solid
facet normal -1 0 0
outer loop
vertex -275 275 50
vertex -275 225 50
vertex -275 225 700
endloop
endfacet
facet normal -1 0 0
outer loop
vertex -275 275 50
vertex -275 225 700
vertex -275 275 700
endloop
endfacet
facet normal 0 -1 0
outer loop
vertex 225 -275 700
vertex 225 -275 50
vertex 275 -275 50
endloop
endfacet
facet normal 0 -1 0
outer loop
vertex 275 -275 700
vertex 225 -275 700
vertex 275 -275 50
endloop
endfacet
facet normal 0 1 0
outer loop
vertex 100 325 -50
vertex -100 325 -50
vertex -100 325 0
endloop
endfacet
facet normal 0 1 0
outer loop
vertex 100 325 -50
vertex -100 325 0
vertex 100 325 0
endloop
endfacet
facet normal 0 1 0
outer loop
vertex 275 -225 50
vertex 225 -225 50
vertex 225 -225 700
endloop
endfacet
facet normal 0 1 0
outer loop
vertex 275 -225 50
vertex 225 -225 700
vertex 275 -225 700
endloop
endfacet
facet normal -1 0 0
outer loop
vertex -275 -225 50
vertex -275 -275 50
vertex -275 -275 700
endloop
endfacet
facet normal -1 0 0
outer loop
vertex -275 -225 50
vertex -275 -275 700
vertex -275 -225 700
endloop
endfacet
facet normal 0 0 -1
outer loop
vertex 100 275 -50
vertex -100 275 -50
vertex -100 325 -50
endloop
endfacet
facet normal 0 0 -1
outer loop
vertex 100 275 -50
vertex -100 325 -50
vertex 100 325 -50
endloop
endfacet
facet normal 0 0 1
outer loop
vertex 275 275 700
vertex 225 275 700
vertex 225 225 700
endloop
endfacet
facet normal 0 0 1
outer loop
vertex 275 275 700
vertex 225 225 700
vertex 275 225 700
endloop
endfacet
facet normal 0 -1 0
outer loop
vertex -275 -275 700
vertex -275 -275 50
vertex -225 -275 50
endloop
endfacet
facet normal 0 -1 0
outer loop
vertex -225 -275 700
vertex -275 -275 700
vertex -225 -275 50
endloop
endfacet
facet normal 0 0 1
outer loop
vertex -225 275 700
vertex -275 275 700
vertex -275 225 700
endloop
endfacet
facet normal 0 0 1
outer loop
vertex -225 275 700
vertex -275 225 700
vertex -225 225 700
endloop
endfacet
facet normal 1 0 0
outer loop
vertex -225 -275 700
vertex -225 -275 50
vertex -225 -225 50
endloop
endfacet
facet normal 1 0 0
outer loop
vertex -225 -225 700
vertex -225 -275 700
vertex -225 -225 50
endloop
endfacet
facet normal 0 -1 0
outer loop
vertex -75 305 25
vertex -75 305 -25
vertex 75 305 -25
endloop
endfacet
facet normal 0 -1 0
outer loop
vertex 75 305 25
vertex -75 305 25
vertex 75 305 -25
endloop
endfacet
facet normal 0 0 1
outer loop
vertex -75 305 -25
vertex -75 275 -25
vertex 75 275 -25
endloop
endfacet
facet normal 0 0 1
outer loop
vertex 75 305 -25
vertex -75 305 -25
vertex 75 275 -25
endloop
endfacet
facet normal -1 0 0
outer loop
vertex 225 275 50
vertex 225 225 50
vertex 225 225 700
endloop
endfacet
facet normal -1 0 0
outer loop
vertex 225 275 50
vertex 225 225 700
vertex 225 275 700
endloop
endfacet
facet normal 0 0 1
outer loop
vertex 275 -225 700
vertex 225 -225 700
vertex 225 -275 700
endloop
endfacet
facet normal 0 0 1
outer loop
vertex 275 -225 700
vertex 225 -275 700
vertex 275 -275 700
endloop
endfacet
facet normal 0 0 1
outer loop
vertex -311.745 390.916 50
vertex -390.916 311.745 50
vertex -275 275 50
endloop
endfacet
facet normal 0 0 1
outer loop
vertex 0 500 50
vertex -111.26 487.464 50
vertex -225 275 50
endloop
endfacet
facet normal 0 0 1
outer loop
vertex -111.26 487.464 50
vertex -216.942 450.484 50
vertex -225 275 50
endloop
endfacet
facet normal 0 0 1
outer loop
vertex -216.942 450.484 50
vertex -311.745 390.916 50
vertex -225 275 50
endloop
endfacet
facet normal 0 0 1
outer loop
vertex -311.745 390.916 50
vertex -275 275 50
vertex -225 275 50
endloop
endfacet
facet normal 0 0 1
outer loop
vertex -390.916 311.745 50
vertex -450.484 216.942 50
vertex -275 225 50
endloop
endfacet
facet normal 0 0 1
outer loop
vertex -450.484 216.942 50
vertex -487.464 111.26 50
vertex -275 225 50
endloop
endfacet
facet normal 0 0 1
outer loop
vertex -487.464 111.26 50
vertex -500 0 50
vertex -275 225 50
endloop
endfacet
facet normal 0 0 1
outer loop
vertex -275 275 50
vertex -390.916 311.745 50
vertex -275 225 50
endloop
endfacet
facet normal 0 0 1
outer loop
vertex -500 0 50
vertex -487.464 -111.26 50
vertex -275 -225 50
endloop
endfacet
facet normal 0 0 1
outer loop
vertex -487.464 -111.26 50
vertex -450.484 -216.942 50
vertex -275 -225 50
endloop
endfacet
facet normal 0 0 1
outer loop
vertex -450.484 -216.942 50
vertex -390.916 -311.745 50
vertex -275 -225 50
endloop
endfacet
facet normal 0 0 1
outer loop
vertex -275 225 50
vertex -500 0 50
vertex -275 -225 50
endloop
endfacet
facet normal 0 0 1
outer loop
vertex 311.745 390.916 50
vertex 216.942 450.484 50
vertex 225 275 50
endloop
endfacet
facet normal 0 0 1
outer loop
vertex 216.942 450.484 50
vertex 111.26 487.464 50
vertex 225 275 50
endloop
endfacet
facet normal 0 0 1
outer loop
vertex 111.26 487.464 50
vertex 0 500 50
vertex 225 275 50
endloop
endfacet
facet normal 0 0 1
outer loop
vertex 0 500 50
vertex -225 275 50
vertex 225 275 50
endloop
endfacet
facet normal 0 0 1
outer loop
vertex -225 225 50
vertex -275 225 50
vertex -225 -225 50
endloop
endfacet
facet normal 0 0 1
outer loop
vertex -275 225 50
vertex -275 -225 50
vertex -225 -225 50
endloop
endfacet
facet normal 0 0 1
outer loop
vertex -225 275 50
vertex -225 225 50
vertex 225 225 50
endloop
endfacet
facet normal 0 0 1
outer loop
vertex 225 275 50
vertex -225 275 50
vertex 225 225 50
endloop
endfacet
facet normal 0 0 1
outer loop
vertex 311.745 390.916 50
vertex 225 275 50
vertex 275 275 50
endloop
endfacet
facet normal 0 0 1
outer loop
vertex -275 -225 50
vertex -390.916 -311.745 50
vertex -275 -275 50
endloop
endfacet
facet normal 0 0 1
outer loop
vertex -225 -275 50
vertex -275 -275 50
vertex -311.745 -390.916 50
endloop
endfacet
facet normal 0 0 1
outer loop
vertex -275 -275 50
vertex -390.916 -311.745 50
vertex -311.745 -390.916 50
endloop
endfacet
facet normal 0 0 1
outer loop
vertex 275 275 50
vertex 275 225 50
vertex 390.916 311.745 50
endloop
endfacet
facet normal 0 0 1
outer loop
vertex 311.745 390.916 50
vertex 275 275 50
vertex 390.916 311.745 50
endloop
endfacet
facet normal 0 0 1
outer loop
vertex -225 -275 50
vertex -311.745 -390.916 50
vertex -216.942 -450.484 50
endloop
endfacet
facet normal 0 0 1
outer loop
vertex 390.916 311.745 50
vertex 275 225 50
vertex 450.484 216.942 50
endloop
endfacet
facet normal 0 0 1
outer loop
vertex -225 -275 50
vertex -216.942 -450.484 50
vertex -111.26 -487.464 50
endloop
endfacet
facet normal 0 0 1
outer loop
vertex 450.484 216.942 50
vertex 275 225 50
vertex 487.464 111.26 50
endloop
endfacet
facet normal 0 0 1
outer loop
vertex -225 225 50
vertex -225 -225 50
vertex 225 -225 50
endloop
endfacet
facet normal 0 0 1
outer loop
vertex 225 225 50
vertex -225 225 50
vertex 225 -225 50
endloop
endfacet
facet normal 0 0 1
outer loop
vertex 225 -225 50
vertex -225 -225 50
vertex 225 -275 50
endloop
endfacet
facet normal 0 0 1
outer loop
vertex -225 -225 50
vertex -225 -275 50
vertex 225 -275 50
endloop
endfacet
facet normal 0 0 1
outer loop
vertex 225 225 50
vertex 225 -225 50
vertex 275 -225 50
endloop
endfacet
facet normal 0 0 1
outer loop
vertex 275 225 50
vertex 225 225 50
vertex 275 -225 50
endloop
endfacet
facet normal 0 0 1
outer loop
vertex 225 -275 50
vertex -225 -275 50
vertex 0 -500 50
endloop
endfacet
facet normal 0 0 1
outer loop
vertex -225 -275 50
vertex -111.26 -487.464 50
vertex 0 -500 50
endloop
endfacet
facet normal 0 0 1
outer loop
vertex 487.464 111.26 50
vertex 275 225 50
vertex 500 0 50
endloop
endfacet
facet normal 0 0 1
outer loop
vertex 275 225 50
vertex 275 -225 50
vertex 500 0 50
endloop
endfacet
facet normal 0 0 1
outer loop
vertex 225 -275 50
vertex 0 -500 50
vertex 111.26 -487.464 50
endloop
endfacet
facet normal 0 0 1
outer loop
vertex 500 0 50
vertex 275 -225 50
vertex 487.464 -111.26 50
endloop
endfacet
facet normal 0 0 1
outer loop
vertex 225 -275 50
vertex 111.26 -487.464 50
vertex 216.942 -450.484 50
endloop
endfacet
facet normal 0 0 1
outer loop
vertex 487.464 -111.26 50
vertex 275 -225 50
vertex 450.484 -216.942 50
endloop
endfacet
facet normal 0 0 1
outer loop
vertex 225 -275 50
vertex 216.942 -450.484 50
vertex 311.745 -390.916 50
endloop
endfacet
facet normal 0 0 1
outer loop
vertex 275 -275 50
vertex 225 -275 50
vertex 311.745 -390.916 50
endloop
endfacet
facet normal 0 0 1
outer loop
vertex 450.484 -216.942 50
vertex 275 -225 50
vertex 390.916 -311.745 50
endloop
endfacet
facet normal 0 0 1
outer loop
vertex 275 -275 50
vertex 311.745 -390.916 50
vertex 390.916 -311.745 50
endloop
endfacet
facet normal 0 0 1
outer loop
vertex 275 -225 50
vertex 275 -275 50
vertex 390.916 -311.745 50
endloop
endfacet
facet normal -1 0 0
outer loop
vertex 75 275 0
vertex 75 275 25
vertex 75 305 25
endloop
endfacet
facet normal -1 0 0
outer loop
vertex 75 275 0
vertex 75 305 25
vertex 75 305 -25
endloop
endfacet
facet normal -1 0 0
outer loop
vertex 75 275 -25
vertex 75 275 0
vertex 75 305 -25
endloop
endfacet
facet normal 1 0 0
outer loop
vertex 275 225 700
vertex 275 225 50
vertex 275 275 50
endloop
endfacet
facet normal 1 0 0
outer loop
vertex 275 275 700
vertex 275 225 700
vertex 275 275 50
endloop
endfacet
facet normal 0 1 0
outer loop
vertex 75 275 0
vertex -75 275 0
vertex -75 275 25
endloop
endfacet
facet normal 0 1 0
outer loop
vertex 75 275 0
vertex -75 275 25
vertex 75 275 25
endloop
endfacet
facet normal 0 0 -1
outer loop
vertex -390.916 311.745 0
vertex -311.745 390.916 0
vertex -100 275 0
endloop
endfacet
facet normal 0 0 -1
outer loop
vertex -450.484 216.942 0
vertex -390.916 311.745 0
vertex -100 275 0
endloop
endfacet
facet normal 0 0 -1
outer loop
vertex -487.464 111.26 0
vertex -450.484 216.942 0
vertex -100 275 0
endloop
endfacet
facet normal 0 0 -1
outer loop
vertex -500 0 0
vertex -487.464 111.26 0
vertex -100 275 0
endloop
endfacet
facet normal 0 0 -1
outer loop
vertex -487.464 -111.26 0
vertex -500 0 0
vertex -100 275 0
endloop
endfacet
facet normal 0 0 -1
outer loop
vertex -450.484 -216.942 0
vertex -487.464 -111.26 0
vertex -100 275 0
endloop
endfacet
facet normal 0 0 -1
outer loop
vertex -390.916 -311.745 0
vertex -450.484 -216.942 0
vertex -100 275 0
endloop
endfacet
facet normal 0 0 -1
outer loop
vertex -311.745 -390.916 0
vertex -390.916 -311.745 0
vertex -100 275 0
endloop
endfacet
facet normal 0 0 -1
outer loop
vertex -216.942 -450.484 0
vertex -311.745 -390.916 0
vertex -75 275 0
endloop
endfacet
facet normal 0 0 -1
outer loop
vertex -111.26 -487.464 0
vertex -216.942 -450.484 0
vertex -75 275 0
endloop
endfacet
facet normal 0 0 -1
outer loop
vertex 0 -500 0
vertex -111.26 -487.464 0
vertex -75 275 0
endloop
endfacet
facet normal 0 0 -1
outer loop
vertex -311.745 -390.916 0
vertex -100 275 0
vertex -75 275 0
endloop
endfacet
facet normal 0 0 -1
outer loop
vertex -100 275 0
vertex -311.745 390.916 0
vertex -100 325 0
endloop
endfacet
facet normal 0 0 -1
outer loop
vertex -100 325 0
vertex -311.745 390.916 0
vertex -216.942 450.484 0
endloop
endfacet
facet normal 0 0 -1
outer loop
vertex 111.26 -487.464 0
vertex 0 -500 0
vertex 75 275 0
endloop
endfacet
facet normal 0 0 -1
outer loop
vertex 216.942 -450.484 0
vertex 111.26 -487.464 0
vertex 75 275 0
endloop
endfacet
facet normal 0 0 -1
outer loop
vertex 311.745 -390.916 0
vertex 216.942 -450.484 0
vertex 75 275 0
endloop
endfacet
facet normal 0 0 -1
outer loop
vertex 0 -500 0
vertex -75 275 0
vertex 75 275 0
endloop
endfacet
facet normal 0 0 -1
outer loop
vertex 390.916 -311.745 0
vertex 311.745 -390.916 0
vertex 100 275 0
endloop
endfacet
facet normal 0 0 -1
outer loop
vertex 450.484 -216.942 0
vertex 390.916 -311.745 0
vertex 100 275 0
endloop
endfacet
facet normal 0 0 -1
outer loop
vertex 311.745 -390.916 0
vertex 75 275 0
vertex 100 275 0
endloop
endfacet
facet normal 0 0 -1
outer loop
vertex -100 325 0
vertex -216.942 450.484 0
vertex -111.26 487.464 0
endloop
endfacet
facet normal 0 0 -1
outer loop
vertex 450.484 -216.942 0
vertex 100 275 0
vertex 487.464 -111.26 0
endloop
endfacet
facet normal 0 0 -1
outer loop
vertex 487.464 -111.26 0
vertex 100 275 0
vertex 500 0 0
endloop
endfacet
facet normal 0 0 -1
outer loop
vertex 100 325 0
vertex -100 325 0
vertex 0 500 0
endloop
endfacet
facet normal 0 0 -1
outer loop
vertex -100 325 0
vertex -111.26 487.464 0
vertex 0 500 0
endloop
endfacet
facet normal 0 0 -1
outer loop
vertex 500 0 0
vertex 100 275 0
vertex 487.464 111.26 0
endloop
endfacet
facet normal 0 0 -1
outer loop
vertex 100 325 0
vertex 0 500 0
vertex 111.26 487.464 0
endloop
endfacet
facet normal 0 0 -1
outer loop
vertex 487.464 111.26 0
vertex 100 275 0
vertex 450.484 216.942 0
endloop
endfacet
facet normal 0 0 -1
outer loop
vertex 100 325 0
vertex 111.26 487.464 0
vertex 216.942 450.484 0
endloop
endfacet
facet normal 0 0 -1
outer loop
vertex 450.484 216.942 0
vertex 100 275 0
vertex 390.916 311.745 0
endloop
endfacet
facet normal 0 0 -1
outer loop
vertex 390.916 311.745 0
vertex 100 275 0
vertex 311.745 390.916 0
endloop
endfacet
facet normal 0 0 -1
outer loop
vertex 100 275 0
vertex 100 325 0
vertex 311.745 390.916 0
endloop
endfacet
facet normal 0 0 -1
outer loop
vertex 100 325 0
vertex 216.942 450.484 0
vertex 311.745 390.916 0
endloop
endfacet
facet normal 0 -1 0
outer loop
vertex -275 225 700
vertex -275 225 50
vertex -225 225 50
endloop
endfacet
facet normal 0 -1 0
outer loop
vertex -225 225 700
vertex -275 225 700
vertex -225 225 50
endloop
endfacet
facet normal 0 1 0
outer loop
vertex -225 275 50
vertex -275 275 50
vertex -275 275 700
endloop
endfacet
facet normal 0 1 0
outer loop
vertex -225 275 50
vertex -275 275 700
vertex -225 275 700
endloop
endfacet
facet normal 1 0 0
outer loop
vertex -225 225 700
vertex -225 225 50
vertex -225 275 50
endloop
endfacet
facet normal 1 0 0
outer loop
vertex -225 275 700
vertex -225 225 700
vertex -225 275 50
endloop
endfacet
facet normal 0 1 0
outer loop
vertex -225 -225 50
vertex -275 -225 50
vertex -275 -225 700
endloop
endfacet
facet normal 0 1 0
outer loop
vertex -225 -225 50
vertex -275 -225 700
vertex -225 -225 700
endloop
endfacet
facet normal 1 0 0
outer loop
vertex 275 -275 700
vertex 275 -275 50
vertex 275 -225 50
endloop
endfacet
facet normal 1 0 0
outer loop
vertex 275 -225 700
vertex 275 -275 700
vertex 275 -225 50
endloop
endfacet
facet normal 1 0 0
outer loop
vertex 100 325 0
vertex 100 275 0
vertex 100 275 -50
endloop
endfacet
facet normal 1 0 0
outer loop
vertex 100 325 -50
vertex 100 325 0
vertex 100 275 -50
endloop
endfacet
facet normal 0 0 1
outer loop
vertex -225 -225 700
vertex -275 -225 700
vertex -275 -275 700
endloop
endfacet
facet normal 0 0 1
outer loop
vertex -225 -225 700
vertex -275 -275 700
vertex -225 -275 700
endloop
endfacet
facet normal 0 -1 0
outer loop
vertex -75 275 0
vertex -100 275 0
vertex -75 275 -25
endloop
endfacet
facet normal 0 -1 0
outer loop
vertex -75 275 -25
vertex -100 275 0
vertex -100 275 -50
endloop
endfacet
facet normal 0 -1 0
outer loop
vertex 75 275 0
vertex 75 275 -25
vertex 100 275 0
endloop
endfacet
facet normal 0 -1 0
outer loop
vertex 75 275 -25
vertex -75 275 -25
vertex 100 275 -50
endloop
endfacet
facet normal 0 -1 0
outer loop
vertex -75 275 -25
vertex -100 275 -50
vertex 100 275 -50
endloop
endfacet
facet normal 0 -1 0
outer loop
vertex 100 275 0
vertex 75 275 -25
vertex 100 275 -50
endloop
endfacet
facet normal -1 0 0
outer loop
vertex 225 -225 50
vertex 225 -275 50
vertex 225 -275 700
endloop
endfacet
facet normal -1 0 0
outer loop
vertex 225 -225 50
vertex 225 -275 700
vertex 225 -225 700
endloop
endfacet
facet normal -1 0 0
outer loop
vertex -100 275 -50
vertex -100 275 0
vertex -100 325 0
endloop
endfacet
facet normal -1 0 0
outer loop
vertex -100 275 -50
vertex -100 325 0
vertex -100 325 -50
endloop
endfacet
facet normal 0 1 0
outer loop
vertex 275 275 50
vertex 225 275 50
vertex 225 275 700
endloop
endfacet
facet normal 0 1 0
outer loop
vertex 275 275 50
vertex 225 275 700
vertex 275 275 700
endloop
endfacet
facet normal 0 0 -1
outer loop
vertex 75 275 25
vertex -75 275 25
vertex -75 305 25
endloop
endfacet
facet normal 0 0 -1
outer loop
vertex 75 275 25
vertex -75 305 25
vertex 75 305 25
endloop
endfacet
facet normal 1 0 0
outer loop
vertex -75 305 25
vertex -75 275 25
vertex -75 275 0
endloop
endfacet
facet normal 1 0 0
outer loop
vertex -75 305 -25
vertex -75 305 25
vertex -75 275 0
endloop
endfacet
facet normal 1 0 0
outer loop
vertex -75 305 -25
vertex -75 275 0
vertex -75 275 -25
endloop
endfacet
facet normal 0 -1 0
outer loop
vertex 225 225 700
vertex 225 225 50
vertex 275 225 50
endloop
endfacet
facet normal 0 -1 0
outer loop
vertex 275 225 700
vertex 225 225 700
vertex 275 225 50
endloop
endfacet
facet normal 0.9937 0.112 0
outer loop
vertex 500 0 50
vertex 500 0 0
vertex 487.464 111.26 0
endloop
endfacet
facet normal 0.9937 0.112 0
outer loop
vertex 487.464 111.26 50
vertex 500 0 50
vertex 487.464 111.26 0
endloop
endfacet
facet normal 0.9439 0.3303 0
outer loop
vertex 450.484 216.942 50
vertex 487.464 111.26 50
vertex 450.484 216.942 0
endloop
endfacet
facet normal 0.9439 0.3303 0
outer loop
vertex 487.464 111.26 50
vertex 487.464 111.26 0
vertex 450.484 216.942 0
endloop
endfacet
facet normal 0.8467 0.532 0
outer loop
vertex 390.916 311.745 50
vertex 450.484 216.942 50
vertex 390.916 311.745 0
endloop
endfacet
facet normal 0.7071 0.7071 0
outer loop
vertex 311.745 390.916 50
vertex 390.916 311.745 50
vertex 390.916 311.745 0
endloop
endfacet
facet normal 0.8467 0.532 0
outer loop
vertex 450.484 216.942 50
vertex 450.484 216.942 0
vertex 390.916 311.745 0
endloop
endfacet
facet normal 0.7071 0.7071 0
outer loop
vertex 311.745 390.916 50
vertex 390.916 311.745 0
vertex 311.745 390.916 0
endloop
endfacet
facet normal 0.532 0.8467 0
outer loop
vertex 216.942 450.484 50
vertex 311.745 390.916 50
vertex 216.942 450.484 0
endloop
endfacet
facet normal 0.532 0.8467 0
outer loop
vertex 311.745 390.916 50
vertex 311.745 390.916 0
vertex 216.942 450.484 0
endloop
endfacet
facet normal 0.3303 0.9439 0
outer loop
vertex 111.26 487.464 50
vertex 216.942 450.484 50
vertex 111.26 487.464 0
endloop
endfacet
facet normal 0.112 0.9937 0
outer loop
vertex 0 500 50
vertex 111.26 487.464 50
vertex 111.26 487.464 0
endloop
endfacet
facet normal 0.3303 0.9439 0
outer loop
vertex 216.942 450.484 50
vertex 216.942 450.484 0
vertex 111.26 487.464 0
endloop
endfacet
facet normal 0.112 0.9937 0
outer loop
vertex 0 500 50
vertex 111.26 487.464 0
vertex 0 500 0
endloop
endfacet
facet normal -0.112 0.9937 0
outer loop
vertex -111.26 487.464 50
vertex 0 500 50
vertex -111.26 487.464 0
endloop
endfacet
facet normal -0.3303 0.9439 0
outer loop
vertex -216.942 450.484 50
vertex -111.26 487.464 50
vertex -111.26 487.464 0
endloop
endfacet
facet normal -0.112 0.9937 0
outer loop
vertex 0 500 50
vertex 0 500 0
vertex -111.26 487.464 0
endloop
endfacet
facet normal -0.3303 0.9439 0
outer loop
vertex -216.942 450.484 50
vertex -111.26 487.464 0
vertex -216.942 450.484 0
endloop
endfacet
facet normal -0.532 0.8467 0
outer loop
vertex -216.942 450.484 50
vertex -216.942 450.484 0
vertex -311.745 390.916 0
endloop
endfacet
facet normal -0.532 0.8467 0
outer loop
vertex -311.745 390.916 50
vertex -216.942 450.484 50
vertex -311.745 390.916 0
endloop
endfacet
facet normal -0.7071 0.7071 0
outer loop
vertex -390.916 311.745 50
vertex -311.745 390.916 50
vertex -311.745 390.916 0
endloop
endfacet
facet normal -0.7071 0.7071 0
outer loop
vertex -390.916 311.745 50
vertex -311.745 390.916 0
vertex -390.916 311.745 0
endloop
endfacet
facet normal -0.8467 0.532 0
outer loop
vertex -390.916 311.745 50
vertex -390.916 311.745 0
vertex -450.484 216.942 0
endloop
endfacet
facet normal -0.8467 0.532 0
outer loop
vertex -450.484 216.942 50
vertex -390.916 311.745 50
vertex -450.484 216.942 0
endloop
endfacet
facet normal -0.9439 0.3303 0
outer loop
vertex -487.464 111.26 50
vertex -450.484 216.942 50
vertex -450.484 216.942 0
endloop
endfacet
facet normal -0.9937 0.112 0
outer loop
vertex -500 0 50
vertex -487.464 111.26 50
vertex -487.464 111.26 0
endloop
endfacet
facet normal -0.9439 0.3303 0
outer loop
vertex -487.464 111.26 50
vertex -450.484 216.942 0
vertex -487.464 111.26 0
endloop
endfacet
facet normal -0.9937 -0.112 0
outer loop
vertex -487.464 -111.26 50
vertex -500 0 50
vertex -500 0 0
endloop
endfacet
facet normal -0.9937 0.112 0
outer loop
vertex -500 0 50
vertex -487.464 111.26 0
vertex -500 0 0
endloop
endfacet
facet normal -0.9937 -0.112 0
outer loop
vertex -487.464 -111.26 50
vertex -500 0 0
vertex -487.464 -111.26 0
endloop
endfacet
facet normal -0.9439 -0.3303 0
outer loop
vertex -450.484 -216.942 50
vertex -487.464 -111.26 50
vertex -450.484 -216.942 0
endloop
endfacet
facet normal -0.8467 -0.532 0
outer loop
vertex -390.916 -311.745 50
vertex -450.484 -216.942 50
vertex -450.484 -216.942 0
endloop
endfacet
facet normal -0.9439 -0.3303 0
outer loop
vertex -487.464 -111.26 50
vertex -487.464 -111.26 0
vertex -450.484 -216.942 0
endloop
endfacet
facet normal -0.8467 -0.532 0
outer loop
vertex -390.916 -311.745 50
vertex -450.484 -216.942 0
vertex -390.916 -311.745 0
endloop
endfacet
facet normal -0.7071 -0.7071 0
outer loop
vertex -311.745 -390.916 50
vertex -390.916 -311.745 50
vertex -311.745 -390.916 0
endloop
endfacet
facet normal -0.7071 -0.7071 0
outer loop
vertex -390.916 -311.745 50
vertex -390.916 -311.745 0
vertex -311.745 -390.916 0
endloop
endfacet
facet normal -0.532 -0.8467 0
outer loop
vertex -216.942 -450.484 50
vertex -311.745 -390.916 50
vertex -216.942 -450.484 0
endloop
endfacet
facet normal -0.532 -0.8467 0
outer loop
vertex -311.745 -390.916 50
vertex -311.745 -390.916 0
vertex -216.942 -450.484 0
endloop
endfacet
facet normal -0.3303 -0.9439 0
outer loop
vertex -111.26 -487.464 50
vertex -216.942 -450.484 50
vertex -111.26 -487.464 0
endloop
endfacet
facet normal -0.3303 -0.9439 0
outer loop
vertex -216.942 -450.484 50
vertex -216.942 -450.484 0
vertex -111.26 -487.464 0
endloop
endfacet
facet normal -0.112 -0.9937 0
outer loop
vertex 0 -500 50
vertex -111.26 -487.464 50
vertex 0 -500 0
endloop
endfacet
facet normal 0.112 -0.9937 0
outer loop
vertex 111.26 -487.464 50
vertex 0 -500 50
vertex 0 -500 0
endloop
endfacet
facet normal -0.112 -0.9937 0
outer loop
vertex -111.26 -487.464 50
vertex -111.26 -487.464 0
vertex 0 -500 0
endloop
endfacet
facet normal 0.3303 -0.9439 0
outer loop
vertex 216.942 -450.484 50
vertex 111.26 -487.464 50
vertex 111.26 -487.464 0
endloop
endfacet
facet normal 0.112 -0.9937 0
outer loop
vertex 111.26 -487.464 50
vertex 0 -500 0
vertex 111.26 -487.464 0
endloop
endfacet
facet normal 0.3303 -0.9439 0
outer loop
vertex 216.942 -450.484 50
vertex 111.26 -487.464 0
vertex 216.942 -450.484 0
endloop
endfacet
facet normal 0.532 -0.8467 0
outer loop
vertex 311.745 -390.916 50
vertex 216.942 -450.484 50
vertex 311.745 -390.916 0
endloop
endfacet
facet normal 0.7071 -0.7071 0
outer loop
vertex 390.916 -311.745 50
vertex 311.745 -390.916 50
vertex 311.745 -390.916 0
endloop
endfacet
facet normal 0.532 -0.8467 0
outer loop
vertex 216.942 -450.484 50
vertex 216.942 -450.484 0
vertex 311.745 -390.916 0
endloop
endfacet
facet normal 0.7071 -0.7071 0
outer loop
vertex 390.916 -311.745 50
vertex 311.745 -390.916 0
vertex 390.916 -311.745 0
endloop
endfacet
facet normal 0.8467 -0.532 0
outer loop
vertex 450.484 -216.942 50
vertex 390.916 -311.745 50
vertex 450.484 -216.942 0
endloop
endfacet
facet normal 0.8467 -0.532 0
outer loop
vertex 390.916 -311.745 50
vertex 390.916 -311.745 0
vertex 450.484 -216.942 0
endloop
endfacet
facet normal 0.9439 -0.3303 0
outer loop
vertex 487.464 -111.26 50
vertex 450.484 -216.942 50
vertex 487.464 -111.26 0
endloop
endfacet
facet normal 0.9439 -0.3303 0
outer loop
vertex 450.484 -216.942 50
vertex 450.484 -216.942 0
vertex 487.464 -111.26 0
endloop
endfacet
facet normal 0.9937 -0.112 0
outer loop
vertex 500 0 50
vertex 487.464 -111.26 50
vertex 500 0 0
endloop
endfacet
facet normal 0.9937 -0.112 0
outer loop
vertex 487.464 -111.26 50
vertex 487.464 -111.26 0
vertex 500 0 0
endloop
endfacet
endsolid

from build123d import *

# Parameters (mm, degrees)
SKETCH_1_R          = 500
EXTRUDE_1_DEPTH     = 50
SKETCH_2_W          = 50
SKETCH_2_H          = 50
EXTRUDE_2_DEPTH     = 700
SKETCH_3_W          = 50
SKETCH_3_H          = 50
EXTRUDE_3_DEPTH     = 700
SKETCH_4_W          = 50
SKETCH_4_H          = 50
EXTRUDE_4_DEPTH     = 700
SKETCH_5_W          = 50
SKETCH_5_H          = 50
EXTRUDE_5_DEPTH     = 700
SKETCH_6_W          = 200
SKETCH_6_H          = 100
EXTRUDE_6_DEPTH     = 50
SKETCH_7_W          = 150
SKETCH_7_H          = 50
CUT_EXTRUDE_1_DEPTH = 30


with BuildPart() as part:
    # 草图1 → 凸台-拉伸1 (new body)
    with BuildSketch(Plane.XY):
        Circle(SKETCH_1_R)
    extrude(amount=EXTRUDE_1_DEPTH)

    # 草图2 → 凸台-拉伸2 (add)
    with BuildSketch(Plane.XY):
        with Locations((250, 250)):
            Rectangle(SKETCH_2_W, SKETCH_2_H)
    extrude(amount=EXTRUDE_2_DEPTH)

    # 草图3 → 凸台-拉伸3 (add)
    with BuildSketch(Plane.XY):
        with Locations((-250, 250)):
            Rectangle(SKETCH_3_W, SKETCH_3_H)
    extrude(amount=EXTRUDE_3_DEPTH)

    # 草图4 → 凸台-拉伸4 (add)
    with BuildSketch(Plane.XY):
        with Locations((250, -250)):
            Rectangle(SKETCH_4_W, SKETCH_4_H)
    extrude(amount=EXTRUDE_4_DEPTH)

    # 草图5 → 凸台-拉伸5 (add)
    with BuildSketch(Plane.XY):
        with Locations((-250, -250)):
            Rectangle(SKETCH_5_W, SKETCH_5_H)
    extrude(amount=EXTRUDE_5_DEPTH)

    # 草图6 → 凸台-拉伸6 (add)
    with BuildSketch(Plane(origin=(0, 275, 0), x_dir=(1, 0, 0), z_dir=(0, 1, 0))):
        Rectangle(SKETCH_6_W, SKETCH_6_H)
    extrude(amount=EXTRUDE_6_DEPTH)

    # 草图7 → 切除-拉伸1 (cut)
    with BuildSketch(Plane(origin=(0, 275, 0), x_dir=(1, 0, 0), z_dir=(0, 1, 0))):
        Rectangle(SKETCH_7_W, SKETCH_7_H)
    extrude(amount=CUT_EXTRUDE_1_DEPTH, mode=Mode.SUBTRACT)


solid = part.part
